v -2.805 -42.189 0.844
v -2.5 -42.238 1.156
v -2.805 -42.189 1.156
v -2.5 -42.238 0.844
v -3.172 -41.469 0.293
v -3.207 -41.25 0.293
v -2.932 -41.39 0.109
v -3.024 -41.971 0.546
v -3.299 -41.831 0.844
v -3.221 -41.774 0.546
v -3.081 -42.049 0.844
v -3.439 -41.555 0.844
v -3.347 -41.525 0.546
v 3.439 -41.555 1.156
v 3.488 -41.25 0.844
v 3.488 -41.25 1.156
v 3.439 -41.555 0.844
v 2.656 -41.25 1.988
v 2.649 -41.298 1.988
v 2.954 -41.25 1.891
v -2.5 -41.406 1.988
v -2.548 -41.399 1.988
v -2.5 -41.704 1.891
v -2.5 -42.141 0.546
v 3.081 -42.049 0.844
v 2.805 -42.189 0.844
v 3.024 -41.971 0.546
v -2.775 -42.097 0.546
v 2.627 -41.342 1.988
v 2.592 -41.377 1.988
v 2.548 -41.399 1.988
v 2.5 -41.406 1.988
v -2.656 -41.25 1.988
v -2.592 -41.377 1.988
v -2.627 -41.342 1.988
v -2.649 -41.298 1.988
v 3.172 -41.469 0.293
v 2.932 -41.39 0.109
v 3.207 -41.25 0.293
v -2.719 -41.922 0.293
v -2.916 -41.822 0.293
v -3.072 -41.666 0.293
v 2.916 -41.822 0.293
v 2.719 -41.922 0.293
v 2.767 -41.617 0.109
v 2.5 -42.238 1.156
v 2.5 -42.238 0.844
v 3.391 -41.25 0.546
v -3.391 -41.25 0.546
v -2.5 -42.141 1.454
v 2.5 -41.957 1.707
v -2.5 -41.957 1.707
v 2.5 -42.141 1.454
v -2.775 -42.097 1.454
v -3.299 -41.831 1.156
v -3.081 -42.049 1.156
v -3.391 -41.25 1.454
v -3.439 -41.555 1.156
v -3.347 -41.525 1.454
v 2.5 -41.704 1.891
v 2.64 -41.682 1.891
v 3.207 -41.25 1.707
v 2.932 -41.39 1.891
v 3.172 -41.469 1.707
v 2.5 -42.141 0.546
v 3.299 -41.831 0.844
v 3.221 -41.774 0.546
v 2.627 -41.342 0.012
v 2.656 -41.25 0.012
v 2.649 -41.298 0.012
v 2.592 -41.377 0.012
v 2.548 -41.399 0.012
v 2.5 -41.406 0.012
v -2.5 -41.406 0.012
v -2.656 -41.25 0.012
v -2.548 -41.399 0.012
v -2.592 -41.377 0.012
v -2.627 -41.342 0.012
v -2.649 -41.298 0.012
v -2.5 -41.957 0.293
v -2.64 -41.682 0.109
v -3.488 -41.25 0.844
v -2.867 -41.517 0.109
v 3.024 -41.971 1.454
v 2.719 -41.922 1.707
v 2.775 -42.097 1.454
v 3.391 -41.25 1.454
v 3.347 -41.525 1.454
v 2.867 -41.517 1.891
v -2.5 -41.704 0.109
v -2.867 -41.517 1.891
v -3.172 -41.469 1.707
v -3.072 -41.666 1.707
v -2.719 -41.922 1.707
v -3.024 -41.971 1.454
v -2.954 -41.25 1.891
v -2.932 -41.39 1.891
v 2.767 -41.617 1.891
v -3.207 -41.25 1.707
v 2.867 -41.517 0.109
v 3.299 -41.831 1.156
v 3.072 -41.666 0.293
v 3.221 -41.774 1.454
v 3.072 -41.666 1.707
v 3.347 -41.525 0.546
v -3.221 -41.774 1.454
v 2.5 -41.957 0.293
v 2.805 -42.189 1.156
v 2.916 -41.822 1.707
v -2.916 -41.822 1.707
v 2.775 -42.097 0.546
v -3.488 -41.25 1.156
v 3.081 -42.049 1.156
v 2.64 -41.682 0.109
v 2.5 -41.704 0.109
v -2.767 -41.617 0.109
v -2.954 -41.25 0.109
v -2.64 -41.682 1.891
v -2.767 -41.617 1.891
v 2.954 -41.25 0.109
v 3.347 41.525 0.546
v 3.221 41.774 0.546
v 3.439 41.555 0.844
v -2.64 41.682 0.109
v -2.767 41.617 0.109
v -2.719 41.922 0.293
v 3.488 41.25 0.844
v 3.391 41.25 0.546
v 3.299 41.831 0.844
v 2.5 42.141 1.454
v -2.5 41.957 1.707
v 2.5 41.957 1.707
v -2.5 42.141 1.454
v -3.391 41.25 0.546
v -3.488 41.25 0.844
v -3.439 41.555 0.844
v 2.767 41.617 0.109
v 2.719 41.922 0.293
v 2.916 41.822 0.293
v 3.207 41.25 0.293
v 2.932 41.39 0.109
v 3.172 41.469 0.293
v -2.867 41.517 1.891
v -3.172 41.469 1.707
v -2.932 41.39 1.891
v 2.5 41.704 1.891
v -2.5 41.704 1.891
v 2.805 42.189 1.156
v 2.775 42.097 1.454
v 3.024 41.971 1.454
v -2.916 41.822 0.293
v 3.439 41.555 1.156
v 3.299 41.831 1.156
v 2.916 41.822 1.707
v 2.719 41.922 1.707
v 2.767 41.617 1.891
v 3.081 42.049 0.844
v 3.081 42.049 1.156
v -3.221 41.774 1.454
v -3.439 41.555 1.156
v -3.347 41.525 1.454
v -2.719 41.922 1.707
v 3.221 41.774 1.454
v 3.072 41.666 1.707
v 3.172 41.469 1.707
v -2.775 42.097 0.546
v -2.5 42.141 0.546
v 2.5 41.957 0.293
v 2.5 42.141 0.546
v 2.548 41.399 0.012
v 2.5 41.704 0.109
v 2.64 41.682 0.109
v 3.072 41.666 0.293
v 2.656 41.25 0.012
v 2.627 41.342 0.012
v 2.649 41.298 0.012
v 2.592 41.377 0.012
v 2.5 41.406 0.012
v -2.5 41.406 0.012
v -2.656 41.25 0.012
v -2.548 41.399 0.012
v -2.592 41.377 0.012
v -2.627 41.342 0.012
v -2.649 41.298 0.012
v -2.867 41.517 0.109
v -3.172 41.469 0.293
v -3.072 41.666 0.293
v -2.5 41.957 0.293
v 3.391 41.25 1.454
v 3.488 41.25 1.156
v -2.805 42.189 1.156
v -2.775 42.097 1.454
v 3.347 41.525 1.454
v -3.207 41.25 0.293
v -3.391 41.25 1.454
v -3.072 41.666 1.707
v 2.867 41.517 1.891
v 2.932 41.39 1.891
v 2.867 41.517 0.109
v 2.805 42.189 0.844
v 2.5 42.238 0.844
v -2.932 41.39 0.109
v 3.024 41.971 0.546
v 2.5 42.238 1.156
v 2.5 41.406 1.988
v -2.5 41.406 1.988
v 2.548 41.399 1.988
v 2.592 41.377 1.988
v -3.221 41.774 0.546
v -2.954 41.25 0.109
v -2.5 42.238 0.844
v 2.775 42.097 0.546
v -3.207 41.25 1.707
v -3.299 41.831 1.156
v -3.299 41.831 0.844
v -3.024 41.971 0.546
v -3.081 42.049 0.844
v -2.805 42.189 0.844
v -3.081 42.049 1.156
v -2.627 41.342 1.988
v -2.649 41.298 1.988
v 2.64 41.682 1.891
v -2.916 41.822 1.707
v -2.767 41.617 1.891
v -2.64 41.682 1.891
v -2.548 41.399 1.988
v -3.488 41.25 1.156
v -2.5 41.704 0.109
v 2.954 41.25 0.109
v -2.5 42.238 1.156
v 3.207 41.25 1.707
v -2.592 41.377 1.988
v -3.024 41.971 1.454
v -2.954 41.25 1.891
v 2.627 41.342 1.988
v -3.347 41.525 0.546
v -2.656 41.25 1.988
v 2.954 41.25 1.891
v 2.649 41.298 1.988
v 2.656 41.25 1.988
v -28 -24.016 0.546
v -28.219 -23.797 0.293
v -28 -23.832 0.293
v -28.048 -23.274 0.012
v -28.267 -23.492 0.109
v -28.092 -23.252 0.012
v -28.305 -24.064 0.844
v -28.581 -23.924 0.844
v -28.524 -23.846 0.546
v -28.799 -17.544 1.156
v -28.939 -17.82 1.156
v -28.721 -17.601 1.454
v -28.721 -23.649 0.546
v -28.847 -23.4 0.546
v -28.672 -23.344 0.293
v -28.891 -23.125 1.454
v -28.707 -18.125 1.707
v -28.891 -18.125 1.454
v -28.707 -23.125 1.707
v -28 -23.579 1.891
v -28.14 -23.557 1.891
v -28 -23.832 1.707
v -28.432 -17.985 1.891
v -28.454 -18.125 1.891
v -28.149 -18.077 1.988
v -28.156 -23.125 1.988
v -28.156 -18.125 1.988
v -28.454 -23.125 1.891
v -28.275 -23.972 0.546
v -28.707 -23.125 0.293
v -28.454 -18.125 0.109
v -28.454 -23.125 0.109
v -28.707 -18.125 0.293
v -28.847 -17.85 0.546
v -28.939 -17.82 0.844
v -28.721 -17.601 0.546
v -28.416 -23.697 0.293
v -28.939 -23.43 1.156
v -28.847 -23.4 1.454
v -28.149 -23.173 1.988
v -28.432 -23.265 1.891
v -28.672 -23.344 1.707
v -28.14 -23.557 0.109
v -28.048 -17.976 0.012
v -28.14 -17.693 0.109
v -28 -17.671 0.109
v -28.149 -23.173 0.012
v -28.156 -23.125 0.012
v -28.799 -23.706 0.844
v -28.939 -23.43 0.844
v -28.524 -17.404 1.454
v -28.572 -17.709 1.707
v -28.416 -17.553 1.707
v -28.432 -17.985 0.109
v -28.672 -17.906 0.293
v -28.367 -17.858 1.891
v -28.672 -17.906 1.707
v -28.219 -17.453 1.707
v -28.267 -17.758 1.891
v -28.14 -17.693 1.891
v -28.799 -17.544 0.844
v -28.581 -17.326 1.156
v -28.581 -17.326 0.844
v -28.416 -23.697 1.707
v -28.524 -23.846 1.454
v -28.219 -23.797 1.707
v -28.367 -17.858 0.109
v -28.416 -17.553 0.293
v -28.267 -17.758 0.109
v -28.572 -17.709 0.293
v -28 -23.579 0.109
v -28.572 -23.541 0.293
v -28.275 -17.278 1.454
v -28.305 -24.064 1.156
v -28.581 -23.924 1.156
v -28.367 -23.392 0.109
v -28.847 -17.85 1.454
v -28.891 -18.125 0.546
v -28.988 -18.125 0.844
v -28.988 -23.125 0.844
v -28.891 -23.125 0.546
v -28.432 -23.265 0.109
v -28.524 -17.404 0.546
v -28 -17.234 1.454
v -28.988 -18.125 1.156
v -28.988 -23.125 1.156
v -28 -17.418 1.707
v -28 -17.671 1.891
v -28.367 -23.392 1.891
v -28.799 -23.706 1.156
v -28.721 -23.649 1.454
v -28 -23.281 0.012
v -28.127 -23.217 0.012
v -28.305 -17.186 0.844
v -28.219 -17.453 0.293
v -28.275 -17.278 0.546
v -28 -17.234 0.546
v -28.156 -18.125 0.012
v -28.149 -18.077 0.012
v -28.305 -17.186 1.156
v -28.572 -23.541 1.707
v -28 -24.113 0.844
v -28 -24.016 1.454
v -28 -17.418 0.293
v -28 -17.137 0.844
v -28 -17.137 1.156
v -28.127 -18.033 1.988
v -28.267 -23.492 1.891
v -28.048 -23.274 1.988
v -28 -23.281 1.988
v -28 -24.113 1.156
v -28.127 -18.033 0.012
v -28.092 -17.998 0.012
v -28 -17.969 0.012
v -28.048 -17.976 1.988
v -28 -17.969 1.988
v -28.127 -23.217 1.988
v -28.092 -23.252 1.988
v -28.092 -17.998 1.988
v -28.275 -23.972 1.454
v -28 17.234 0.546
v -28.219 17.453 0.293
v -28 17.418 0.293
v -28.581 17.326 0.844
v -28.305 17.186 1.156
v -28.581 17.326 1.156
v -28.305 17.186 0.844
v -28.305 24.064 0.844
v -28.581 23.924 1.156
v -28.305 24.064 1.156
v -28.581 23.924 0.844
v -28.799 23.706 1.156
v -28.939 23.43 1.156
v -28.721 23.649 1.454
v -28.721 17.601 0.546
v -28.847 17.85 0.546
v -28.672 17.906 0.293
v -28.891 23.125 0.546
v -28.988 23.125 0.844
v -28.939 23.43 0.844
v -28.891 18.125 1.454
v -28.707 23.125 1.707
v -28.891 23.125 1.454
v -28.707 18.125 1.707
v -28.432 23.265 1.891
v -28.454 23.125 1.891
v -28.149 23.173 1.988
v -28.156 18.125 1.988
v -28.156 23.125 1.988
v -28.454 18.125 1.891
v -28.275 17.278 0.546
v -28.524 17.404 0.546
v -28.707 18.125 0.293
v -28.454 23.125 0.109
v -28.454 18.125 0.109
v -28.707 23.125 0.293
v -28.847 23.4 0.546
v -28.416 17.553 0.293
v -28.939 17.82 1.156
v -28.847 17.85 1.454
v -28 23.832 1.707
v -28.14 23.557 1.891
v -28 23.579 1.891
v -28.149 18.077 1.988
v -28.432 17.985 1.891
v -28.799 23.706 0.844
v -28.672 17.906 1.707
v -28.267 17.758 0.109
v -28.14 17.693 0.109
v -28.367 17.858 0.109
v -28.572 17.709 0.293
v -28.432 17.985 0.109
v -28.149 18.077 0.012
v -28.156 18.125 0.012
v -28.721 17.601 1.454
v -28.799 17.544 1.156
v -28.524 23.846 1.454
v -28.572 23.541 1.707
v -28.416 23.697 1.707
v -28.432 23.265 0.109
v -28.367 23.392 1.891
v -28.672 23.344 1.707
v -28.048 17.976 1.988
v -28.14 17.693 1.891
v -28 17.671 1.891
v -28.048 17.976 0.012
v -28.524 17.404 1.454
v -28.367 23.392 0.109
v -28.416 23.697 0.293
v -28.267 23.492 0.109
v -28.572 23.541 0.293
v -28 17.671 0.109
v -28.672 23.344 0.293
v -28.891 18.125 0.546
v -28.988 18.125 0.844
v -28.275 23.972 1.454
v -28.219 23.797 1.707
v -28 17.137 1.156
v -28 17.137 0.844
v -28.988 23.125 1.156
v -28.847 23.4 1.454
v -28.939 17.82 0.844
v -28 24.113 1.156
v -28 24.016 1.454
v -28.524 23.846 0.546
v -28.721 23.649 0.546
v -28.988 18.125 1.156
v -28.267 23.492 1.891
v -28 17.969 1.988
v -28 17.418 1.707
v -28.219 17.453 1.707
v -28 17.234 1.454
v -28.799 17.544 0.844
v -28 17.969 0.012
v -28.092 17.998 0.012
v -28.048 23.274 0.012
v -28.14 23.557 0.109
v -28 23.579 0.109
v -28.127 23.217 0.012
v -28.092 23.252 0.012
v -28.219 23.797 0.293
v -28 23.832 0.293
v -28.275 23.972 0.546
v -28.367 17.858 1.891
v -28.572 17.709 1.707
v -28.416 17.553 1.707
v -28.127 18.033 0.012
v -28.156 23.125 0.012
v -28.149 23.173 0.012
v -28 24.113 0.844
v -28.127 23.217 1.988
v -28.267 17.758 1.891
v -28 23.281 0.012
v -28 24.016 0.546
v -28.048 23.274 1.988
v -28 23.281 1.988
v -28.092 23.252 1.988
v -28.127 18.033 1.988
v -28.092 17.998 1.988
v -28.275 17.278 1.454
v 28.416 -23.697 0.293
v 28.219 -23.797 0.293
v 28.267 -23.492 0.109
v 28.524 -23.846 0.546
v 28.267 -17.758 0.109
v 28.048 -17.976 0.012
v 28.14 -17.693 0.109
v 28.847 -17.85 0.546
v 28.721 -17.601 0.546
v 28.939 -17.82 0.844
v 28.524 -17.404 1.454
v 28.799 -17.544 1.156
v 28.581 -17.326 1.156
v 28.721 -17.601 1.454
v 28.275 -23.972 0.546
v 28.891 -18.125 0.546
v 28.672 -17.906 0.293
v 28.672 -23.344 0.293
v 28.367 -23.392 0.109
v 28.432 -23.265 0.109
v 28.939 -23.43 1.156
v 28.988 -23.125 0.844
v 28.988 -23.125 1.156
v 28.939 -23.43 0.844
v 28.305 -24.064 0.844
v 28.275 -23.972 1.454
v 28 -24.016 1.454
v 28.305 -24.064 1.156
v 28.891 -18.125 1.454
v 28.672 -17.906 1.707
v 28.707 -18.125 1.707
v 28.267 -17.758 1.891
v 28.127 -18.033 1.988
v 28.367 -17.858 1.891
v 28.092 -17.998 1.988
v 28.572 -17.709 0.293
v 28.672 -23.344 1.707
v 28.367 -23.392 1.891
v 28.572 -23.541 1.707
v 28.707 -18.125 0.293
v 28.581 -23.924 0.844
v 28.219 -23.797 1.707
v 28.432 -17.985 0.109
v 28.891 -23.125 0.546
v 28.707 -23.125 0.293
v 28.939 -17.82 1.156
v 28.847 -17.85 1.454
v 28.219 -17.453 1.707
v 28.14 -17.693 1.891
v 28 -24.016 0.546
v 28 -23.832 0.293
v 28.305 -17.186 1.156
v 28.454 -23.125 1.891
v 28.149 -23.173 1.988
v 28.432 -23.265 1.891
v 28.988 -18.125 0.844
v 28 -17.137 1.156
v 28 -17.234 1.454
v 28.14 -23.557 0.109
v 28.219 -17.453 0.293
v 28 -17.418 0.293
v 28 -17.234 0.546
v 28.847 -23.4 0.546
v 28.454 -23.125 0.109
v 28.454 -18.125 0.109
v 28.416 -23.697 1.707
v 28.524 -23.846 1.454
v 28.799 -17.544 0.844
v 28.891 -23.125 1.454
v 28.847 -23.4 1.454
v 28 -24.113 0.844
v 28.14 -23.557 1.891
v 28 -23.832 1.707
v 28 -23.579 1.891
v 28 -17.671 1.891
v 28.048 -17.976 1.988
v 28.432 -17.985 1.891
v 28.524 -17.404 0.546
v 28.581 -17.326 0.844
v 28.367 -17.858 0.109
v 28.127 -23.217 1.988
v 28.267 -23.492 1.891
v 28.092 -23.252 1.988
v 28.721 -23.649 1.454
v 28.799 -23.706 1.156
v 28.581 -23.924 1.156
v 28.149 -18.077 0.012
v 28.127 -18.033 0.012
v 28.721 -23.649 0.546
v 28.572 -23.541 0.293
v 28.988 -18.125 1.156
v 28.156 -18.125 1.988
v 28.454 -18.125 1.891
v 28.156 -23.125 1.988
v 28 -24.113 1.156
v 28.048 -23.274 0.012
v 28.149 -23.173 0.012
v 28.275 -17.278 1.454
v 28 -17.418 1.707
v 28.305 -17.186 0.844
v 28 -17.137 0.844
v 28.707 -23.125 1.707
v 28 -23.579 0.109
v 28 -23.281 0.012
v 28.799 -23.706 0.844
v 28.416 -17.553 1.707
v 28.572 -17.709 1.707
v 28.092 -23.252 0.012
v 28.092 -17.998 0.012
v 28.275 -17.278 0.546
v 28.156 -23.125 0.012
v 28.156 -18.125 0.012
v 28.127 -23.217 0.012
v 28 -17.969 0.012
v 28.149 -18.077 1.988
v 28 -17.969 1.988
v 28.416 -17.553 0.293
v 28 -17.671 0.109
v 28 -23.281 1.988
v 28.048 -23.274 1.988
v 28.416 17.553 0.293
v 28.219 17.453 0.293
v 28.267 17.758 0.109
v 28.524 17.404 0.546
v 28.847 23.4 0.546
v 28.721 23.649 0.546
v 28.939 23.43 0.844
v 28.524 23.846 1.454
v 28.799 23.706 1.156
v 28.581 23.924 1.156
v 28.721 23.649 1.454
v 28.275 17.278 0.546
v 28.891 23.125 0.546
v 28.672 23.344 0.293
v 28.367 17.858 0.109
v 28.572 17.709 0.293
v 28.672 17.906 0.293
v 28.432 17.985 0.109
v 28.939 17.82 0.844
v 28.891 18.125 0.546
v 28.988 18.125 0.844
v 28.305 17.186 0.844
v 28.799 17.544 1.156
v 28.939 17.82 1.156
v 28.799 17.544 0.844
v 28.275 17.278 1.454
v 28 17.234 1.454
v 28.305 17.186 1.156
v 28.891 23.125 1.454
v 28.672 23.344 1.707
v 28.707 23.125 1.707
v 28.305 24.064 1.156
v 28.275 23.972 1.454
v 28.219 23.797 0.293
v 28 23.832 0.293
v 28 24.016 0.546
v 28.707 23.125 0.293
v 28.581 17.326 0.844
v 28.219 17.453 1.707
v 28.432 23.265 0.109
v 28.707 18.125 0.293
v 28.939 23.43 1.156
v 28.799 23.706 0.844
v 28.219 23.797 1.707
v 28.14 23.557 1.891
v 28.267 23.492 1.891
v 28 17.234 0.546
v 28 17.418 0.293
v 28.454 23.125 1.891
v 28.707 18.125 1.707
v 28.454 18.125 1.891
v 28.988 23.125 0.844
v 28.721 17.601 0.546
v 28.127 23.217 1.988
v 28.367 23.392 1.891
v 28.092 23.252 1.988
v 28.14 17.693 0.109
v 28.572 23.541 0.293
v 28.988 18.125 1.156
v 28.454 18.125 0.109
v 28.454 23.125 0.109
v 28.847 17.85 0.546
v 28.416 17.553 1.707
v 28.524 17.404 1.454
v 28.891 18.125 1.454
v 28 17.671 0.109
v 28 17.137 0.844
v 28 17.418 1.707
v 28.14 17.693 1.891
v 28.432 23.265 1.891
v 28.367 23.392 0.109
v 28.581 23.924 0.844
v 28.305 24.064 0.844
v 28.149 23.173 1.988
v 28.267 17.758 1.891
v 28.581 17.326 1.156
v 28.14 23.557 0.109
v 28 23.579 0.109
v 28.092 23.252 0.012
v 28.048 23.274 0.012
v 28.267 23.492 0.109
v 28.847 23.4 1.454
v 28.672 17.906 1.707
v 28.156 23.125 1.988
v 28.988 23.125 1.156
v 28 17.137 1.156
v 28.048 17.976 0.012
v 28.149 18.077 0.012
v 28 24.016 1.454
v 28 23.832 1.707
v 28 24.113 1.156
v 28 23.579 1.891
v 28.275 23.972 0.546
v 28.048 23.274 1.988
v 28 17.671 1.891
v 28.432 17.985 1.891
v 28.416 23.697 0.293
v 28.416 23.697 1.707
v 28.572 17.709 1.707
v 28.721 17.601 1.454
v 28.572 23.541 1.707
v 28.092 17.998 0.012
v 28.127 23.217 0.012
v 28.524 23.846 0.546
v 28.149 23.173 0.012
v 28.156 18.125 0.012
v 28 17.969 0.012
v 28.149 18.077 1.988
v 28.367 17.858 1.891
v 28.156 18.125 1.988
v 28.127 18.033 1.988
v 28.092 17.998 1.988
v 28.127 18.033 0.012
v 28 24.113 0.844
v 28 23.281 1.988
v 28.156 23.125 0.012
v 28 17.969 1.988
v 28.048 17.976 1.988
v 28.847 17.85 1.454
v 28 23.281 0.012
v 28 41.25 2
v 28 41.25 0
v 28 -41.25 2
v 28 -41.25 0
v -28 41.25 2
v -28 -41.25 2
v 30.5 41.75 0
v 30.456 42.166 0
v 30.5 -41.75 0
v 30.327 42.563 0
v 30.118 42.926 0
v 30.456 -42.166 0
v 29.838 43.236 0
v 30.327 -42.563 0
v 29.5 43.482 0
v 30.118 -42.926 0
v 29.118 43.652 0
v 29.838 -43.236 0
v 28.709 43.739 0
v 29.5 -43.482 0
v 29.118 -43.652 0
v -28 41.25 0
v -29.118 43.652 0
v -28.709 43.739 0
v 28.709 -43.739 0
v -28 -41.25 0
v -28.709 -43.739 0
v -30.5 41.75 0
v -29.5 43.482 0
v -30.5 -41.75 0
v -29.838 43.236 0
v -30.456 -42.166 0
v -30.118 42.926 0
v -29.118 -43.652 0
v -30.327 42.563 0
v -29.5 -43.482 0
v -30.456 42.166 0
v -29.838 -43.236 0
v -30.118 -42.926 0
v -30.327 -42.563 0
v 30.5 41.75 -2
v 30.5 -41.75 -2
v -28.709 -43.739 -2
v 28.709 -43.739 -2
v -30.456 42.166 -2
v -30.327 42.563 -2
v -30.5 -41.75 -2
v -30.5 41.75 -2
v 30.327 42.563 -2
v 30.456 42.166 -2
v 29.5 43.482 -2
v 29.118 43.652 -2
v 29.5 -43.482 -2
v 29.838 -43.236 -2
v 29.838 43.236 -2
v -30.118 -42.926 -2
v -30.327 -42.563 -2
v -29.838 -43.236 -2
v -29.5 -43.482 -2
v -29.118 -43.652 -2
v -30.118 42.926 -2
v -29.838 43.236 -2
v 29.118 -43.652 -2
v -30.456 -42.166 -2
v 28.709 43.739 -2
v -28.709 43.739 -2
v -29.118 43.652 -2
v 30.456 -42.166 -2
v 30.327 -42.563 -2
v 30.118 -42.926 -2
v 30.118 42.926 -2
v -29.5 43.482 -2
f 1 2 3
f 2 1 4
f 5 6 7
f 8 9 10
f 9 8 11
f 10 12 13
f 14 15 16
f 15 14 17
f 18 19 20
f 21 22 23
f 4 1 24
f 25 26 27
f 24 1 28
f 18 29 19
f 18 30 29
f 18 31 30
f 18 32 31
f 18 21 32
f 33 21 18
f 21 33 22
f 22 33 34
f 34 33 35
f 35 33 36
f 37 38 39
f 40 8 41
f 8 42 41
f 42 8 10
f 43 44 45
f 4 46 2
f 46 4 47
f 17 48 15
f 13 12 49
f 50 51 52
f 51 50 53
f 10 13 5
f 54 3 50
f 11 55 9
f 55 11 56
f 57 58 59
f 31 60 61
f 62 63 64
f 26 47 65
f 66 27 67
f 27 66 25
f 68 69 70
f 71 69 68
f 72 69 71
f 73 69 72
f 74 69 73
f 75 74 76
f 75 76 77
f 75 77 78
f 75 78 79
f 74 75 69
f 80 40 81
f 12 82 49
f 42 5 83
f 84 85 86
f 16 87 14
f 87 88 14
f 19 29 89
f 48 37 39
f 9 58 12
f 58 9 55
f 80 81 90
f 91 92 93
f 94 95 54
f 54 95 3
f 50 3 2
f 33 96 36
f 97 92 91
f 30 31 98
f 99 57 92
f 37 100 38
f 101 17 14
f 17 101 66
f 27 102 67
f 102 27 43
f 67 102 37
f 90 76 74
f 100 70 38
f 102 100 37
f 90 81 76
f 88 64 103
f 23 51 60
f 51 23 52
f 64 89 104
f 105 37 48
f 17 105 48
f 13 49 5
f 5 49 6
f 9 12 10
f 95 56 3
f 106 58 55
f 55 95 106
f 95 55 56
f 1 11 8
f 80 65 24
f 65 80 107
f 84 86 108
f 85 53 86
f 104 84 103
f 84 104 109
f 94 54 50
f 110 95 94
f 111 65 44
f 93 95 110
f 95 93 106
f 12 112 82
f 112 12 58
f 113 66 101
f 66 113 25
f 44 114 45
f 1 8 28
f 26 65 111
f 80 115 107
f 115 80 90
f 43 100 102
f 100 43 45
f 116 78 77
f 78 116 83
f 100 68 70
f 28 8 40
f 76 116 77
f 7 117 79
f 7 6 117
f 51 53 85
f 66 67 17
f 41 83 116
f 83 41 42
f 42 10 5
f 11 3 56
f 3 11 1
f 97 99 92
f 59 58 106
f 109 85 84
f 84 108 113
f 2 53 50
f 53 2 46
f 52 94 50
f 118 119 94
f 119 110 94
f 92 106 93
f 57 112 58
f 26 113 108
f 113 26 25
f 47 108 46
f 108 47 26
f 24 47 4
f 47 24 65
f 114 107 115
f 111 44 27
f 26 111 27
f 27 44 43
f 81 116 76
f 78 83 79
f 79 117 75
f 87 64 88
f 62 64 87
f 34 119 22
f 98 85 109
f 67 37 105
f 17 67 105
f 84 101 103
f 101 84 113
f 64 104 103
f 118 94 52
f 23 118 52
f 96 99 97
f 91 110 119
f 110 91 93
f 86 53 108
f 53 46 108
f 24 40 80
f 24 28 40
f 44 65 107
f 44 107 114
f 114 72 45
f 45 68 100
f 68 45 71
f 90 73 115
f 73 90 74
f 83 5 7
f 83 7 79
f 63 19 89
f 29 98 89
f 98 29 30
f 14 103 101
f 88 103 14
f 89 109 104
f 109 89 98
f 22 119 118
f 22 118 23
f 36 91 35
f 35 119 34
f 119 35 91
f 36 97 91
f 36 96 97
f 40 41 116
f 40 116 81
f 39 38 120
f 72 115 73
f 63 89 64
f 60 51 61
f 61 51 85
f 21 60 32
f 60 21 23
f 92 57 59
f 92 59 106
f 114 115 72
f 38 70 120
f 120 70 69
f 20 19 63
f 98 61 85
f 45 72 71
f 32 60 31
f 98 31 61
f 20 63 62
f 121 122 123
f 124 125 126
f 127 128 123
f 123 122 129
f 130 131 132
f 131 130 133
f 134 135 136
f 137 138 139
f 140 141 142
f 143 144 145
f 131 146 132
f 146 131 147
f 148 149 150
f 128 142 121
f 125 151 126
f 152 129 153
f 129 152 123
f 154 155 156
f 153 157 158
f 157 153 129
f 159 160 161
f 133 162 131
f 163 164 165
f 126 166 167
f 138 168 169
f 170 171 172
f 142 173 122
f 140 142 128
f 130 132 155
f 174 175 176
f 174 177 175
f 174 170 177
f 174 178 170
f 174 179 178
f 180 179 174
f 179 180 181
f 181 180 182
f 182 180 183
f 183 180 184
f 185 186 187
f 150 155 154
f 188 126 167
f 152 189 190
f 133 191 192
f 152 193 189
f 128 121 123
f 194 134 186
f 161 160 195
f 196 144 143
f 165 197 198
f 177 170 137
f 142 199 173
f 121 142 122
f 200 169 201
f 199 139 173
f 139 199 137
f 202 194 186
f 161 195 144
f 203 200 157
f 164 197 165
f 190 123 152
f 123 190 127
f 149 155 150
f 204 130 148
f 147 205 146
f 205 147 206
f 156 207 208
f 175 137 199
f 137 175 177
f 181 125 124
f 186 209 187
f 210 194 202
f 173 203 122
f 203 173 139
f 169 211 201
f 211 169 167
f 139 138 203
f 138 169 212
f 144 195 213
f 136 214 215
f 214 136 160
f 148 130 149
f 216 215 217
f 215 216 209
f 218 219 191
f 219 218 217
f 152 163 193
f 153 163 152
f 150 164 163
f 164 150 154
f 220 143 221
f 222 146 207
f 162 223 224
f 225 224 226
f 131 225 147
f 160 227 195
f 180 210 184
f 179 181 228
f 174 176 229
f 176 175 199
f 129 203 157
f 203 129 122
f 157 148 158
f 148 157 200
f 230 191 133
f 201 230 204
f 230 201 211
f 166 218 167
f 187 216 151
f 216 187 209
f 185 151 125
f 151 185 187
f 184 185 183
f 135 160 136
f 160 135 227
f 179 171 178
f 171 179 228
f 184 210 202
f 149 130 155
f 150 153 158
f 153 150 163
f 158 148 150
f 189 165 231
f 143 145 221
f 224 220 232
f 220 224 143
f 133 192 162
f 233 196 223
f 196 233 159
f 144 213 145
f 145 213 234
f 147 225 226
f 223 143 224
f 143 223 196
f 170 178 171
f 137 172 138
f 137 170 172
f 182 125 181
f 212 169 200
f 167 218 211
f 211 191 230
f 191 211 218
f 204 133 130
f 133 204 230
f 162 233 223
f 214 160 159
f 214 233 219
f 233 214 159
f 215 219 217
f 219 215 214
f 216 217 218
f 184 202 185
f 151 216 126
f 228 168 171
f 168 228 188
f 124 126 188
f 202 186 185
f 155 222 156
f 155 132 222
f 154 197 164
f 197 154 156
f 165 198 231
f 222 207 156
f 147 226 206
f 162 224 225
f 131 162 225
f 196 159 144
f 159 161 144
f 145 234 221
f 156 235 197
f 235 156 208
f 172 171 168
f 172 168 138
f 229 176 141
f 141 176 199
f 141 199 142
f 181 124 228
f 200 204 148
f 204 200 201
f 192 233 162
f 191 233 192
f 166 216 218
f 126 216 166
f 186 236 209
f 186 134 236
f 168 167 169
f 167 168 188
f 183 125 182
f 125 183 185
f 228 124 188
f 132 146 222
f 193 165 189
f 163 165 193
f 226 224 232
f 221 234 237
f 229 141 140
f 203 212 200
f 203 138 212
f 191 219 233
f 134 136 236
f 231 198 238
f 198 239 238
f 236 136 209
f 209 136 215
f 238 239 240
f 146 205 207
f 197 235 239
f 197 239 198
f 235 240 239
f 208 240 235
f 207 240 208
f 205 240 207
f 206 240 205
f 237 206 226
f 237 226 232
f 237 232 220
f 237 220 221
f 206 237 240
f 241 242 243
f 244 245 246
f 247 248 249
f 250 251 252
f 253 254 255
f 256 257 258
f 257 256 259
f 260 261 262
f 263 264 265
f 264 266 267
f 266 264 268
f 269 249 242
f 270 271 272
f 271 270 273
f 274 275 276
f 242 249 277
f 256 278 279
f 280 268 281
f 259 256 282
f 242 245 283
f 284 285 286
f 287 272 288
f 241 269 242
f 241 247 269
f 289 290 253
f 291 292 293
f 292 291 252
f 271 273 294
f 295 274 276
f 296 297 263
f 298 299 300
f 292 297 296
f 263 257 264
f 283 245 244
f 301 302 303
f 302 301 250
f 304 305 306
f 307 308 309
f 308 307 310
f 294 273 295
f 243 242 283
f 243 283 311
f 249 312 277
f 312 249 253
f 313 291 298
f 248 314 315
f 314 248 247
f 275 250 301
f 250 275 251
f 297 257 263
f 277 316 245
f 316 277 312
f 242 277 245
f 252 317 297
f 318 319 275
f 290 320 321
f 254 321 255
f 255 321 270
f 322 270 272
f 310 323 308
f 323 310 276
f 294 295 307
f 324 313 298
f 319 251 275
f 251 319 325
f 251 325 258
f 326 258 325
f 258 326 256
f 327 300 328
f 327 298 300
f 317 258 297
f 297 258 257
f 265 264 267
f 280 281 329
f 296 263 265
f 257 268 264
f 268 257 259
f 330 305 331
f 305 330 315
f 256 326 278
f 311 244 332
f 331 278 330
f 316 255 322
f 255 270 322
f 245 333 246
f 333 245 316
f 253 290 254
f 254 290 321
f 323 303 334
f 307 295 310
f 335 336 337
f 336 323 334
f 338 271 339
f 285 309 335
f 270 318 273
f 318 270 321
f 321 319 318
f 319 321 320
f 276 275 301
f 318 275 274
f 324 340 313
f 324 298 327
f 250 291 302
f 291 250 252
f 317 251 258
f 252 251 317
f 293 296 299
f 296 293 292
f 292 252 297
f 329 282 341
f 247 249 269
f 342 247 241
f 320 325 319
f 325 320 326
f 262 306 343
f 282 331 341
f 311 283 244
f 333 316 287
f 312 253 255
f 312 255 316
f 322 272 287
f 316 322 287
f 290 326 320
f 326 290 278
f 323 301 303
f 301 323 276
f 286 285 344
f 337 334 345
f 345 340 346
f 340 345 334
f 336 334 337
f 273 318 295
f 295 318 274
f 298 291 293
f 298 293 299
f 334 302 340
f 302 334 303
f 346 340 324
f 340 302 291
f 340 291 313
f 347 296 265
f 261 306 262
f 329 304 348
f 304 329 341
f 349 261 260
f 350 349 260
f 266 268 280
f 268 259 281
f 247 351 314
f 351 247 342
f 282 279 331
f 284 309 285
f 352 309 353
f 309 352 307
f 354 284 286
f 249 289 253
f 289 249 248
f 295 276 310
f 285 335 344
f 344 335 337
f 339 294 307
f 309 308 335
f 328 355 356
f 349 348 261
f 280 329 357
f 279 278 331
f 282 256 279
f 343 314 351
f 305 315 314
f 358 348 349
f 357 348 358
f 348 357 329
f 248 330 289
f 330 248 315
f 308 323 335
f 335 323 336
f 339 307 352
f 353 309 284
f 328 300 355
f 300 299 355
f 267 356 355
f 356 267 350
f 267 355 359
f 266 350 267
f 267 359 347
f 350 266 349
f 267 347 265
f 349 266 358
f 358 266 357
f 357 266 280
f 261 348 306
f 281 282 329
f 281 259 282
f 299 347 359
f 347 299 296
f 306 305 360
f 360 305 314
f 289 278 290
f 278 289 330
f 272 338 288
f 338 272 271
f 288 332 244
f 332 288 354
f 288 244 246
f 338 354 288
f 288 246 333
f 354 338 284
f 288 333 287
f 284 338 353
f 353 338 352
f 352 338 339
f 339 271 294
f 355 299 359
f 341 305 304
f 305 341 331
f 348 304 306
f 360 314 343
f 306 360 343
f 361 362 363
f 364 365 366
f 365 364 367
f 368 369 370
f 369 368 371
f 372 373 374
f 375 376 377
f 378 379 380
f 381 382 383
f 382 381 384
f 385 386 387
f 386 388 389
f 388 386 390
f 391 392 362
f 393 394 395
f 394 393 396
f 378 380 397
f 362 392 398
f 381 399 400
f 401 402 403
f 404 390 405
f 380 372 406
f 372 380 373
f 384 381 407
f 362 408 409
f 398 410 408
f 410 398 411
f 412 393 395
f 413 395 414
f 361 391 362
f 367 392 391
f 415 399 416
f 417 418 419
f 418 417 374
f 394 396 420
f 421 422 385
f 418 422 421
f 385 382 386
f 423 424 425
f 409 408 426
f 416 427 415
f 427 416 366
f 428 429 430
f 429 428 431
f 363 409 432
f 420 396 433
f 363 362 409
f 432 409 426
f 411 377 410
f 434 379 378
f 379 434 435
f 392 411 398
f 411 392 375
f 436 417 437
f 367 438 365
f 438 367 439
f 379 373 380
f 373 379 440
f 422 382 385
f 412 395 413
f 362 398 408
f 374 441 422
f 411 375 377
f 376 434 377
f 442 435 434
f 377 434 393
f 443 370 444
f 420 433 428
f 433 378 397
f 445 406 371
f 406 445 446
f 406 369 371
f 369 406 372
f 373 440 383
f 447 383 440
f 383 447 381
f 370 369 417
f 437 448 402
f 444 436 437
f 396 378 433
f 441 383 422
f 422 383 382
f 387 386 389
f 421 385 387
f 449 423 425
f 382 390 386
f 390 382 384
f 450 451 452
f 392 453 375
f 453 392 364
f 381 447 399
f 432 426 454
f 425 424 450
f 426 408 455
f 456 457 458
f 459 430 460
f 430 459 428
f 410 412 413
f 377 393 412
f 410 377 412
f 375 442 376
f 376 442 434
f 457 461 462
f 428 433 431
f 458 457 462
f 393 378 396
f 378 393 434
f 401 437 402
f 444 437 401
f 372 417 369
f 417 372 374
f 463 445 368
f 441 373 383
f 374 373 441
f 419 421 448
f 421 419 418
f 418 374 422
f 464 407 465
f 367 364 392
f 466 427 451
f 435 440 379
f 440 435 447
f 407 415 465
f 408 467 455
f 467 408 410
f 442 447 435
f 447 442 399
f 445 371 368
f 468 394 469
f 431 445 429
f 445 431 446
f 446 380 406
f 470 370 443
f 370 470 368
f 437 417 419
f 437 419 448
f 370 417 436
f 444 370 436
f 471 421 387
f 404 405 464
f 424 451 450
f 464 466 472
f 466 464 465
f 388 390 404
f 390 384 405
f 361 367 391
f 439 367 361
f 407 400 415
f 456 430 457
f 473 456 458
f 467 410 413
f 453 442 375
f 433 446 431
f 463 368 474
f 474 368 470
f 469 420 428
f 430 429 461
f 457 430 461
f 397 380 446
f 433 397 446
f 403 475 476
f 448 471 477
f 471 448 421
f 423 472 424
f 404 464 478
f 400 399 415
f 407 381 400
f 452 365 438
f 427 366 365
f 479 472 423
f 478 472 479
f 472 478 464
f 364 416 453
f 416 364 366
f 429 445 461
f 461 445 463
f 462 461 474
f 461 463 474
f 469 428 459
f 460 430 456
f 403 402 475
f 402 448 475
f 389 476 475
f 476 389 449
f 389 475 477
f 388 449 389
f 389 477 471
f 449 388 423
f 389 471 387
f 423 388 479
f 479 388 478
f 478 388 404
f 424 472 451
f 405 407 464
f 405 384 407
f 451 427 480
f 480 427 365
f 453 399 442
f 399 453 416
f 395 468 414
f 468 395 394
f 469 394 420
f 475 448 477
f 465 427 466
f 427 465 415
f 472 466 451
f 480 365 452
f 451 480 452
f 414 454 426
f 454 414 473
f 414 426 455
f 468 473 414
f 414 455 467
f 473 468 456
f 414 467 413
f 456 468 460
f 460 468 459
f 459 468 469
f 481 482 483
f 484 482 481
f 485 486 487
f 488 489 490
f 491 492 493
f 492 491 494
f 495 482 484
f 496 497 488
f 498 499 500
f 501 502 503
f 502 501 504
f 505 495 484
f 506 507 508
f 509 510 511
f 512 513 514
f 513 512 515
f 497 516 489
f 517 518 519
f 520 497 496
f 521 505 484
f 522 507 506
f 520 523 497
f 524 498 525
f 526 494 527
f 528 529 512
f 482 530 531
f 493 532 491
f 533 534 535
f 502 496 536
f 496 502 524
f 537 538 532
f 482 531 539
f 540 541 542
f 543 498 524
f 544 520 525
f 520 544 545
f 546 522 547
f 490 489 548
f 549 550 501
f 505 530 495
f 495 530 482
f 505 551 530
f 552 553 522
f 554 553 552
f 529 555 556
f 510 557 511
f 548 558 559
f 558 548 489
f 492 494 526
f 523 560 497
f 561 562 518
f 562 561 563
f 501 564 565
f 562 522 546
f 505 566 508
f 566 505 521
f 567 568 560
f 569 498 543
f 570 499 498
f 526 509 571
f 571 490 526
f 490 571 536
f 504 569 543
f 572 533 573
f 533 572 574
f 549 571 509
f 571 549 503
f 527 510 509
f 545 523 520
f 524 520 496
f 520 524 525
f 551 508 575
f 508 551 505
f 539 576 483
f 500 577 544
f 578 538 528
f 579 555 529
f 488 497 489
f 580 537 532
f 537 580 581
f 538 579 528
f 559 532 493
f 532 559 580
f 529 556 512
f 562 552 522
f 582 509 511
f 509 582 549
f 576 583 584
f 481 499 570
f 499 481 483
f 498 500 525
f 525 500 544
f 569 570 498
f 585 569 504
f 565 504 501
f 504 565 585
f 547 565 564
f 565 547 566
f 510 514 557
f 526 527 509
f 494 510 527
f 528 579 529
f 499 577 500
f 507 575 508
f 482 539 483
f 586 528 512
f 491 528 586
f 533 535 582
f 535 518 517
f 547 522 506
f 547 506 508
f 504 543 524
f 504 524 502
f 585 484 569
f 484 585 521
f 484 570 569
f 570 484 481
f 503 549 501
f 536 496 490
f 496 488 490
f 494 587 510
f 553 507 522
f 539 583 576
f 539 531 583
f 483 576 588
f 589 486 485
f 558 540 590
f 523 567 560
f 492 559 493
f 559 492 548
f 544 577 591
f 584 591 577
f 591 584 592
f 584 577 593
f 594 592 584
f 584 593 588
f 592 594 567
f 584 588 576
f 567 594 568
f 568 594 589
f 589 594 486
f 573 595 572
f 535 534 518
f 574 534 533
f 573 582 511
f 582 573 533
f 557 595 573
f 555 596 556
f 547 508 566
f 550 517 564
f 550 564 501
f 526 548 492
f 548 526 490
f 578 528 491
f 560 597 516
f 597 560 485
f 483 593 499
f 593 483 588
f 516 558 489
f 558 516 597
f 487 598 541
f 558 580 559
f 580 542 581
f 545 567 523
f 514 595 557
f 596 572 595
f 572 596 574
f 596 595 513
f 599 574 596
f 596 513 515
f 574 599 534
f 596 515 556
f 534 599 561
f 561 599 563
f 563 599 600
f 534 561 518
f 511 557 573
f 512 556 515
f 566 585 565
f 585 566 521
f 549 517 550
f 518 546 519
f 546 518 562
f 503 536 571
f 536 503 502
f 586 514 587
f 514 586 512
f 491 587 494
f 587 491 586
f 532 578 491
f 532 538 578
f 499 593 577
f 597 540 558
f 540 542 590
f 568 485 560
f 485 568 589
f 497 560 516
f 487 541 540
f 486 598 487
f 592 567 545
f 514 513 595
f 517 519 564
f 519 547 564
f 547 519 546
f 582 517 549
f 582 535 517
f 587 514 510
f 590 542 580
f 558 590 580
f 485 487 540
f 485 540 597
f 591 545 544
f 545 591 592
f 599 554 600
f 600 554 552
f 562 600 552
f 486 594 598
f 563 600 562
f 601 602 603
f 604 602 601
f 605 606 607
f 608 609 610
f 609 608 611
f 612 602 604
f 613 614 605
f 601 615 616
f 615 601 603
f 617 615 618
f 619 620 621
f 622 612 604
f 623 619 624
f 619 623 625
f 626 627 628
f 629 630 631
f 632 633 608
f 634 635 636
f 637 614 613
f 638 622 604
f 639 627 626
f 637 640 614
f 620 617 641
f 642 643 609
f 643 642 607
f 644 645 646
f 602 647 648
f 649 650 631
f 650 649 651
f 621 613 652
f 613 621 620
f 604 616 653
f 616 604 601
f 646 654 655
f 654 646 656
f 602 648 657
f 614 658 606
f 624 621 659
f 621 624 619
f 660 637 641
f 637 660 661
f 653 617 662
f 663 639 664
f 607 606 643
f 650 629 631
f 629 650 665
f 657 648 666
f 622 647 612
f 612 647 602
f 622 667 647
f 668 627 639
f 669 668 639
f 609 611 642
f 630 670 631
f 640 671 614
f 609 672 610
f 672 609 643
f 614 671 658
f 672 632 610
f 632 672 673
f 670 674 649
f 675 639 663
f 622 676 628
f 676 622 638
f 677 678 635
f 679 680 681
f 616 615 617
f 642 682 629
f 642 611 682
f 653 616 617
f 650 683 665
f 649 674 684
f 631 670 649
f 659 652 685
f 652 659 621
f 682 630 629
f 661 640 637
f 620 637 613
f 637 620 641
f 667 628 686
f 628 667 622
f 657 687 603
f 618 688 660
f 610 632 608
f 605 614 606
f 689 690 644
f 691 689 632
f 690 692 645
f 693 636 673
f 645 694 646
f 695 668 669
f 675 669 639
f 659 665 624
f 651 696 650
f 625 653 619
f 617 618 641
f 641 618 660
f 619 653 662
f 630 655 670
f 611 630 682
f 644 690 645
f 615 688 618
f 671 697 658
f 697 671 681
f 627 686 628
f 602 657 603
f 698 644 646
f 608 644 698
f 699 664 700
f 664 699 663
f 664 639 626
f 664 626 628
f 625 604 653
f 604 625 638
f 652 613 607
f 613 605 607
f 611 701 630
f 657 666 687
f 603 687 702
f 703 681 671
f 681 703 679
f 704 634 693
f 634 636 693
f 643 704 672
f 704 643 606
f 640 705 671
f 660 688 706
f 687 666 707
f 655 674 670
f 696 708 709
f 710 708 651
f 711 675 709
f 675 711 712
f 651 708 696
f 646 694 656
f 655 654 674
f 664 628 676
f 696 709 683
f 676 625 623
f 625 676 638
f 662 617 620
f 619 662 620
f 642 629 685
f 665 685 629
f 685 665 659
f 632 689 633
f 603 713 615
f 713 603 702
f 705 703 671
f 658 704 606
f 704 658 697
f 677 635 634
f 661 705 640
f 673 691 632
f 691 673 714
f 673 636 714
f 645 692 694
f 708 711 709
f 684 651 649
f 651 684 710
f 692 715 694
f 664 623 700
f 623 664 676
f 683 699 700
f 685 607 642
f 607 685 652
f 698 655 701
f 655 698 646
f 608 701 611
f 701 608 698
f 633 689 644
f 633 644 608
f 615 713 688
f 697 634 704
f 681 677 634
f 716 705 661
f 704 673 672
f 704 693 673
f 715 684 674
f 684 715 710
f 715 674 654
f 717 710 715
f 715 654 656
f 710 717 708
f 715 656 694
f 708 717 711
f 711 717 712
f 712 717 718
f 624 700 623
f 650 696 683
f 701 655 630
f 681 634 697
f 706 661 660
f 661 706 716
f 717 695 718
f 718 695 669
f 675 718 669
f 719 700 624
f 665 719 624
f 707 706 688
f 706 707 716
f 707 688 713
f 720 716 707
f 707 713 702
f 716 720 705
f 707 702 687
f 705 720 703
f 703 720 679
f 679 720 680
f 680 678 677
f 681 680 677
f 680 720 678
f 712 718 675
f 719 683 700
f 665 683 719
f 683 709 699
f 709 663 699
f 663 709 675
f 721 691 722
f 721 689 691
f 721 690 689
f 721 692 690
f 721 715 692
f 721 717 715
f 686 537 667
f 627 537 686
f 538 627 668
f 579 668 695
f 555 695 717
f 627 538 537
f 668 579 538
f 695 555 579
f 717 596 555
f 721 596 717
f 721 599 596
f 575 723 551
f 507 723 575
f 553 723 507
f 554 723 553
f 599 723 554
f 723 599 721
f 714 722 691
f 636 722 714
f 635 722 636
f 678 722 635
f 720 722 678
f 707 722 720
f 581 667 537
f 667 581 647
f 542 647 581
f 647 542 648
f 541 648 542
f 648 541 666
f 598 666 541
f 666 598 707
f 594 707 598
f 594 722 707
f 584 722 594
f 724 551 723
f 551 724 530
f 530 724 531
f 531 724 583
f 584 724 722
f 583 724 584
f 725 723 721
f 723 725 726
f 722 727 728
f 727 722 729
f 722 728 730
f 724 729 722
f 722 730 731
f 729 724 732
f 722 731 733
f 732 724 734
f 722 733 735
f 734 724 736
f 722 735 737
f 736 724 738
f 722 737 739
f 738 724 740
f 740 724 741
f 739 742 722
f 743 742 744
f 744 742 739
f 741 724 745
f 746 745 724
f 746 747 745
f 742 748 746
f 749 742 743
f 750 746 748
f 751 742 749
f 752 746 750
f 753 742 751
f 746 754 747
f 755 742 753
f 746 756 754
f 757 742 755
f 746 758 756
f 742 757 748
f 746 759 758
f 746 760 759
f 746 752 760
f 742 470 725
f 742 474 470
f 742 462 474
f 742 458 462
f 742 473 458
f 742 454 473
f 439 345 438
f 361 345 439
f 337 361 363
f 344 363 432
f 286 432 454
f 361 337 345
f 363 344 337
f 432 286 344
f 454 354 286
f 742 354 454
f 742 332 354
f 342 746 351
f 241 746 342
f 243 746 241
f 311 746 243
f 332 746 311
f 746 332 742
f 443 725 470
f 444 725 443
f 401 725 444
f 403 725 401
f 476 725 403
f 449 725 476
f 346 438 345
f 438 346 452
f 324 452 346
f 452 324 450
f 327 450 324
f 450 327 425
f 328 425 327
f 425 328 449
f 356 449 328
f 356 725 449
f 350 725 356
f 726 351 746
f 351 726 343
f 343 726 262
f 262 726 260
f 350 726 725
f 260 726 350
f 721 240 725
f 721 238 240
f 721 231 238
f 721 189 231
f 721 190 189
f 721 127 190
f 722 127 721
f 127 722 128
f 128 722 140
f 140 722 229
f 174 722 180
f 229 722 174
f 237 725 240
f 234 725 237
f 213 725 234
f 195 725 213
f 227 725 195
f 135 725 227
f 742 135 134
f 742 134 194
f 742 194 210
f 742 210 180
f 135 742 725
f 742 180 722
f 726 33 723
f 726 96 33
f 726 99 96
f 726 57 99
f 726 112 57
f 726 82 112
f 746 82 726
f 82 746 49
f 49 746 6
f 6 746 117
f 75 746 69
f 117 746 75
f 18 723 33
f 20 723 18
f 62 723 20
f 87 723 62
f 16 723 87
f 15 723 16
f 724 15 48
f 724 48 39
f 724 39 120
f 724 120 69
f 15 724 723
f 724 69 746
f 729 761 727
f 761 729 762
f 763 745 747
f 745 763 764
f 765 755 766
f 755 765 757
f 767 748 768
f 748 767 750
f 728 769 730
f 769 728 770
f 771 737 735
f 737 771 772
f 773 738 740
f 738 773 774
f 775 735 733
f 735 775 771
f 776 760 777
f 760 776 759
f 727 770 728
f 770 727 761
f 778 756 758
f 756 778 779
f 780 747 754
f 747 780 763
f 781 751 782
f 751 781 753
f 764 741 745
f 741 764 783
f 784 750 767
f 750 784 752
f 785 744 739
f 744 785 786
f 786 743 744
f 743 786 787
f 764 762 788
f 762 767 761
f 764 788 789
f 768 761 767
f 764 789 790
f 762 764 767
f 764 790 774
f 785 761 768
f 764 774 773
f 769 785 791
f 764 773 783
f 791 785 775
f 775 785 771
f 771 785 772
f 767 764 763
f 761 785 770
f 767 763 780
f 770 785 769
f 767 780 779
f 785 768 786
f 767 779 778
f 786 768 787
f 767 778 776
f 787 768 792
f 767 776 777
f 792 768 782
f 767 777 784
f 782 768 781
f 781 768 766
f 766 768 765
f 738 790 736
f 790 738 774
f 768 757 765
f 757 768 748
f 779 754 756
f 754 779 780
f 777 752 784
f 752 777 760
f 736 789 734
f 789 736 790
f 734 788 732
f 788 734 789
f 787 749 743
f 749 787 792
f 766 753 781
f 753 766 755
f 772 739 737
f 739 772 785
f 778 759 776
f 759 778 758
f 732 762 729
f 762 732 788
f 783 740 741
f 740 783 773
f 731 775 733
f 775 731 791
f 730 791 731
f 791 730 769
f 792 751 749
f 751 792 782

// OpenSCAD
NumPadWidth=46;
NumPadHeight=57;
NumPadRadius=7/2;
NumPadDispalyDistance=5.5;
DisplayHeight=7;
DisplayWidth=24;
DisplayOuterHeight=13;
DisplayOuterWidth=40;
Thickness=2;

NumPadFrontThickness=3;
DisplayFrontThickness=1;

PcbWidth=56;
PcbHeight=82.5;

HousingInnerHeight=18-3;

UsbWidth=12;
UsbHeight=10;
UsbRadius=1.5;
UsbTopOffset=4+3;

ScrewDia=2.5;
ScrewHeadDia=4.5;
ScrewHeadDepth=1.5;

ScrewOffsetX=46;
ScrewOffsetY=59;


//lid();
lid2();
//housing();

//translate([0,2.5,10])cube([NumPadWidth,NumPadHeight,2*HousingInnerHeight],center=true);

module housing(){
    difference(){
        hull()for(ix=[-1,1])for(iy=[-1,1])translate([ix*(PcbWidth+1)/2,iy*(PcbHeight+1)/2,0])cylinder(r=Thickness,h=HousingInnerHeight+NumPadFrontThickness+Thickness,$fn=30);
            
        // Inner
        cube([PcbWidth+1,PcbHeight+1,2*(HousingInnerHeight+Thickness)],center=true);
        
        // NumPad
        hull()for(ix=[-1,1])for(iy=[-1,1])translate([ix*(NumPadWidth-2*NumPadRadius+1)/2,iy*(NumPadHeight-2*NumPadRadius+1)/2+2.5,0])cylinder(r=NumPadRadius,h=2*HousingInnerHeight,$fn=30);
            
        // ScrewHoles
        for(ix=[-1,1])for(iy=[-1,1])translate([ix*(ScrewOffsetX)/2,iy*(ScrewOffsetY)/2+2.5,0]){
            cylinder(r=ScrewDia/2,h=2*HousingInnerHeight,$fn=30);
            translate([0,0,HousingInnerHeight+Thickness+NumPadFrontThickness-ScrewHeadDepth])cylinder(r=ScrewHeadDia/2,h=2*HousingInnerHeight,$fn=30);
        }
        
        // Display
        translate([0,-NumPadHeight/2-DisplayHeight/2+2.5-NumPadDispalyDistance,0])cube([DisplayWidth,DisplayHeight,2*(HousingInnerHeight+Thickness+NumPadFrontThickness+1)],center=true);
        translate([0,-NumPadHeight/2-DisplayOuterHeight/2+2.5-3,0])cube([DisplayOuterWidth,DisplayOuterHeight,2*(HousingInnerHeight+Thickness+NumPadFrontThickness-DisplayFrontThickness)],center=true);
        
        // USB
        hull()for(ix=[-1,1])for(iz=[-1,1])translate([ix*(UsbWidth-2*UsbRadius)/2,PcbHeight/2-2*Thickness,Thickness+HousingInnerHeight+3-UsbTopOffset+iz*(UsbHeight-2*UsbRadius)/2])%rotate([-90,0,0])cylinder(d=UsbRadius,h=5*Thickness,$fn=15);
        
        // LidSnap
        snap();
    }
}

module snap() {
    for(iy=[-1,1]) translate([0,iy*PcbHeight/2,Thickness/2]) hull()for(ix=[-1,1])translate([ix*5/2,0,0])sphere(d=Thickness,$fn=20);

    for(ix=[-1,1])for(iy=[-1,1]) translate([ix*PcbWidth/2,iy*PcbHeight/4,Thickness/2]) hull()for(iyy=[-1,1])translate([0,iyy*5/2,0])sphere(d=Thickness,$fn=20);
}

module lid() {
    translate([0,0,Thickness/2])cube([PcbWidth,PcbHeight,Thickness],center=true);
    snap();
}

module lid2() {
    lid();
    translate([0,0,-Thickness])hull()for(ix=[-1,1])for(iy=[-1,1])translate([ix*(PcbWidth+1)/2,iy*(PcbHeight+1)/2,0])cylinder(r=Thickness,h=Thickness,$fn=30);

}
